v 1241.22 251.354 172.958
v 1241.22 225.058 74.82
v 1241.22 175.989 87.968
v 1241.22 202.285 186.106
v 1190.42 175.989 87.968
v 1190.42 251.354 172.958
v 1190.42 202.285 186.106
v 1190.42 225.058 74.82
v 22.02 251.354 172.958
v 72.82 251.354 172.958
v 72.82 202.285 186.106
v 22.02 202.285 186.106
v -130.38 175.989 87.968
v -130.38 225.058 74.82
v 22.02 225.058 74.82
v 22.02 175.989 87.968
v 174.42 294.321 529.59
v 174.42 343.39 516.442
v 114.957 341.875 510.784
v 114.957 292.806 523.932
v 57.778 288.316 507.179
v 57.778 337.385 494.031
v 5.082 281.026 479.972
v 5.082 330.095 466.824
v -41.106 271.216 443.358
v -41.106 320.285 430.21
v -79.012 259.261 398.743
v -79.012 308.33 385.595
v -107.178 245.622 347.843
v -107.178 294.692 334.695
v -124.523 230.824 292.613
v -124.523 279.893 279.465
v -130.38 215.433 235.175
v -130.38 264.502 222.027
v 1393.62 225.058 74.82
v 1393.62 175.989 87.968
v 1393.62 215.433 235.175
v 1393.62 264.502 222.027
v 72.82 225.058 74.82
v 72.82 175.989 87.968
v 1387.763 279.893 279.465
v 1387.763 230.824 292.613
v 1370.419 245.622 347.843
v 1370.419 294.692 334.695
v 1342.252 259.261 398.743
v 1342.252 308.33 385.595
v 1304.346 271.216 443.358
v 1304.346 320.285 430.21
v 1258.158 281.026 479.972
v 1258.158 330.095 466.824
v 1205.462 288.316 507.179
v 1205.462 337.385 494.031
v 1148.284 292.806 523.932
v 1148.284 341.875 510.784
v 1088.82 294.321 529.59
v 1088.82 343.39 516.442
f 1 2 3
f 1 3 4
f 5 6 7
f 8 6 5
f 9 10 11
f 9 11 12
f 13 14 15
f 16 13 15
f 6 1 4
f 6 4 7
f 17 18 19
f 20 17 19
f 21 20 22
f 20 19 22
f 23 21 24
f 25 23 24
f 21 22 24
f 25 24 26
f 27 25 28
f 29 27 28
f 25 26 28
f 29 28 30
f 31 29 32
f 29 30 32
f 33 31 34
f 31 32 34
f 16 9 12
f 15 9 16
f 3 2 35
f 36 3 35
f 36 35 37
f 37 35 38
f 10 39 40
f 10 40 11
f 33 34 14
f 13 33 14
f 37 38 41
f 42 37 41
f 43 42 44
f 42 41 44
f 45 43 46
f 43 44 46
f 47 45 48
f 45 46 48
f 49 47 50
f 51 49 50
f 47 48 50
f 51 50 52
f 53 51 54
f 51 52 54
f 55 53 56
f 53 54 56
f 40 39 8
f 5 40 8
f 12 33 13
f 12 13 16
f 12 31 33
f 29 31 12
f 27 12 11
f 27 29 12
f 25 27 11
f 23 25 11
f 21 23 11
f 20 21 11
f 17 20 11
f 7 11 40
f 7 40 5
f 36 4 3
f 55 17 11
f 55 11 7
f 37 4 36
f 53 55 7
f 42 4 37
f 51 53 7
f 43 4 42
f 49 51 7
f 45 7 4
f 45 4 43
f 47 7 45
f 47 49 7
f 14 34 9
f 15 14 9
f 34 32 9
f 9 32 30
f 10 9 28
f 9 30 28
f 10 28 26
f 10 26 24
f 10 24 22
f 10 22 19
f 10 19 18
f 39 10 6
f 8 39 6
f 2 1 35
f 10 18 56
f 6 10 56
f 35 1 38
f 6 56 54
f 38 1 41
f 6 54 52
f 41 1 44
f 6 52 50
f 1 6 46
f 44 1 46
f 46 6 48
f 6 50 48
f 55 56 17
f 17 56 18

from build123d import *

# Parameters (mm, degrees)
PAD003_DEPTH            = 50.8
BODY003_PLACEMENT_ANGLE = 15


with BuildPart() as part:
    # Sketch003 → Pad003 (new body)
    with BuildSketch(Plane.XZ):
        with BuildLine():
            Line((-130.379928, 312.132536), (-130.379928, 159.732536))
            Line((-130.379928, 159.732536), (22.020072, 159.732536))
            Line((22.020072, 261.332536), (22.020072, 159.732536))
            Line((72.820072, 261.332536), (22.020072, 261.332536))
            Line((72.820072, 159.732536), (72.820072, 261.332536))
            Line((72.820072, 159.732536), (1190.420072, 159.732536))
            Line((1190.420072, 261.332536), (1190.420072, 159.732536))
            Line((1241.220072, 261.332536), (1190.420072, 261.332536))
            Line((1241.220072, 159.732536), (1241.220072, 261.332536))
            Line((1241.220072, 159.732536), (1393.620072, 159.732536))
            Line((1393.620072, 159.732536), (1393.620072, 312.132536))
            ThreePointArc((1393.620072, 312.132536), (1304.346219, 527.658683), (1088.820072, 616.932536))
            Line((1088.820072, 616.932536), (174.420072, 616.932536))
            ThreePointArc((174.420072, 616.932536), (-41.106075, 527.658683), (-130.379928, 312.132536))
        make_face()
    extrude(amount=PAD003_DEPTH)


with BuildPart() as part_1:
    # Body003 placement: moved
    add(part.part.moved(Location((0, 183.716529, -79.469557))).rotate(Axis((0, 183.716529, -79.469557), (-1, 0, 0)), BODY003_PLACEMENT_ANGLE))


solid = part_1.part
